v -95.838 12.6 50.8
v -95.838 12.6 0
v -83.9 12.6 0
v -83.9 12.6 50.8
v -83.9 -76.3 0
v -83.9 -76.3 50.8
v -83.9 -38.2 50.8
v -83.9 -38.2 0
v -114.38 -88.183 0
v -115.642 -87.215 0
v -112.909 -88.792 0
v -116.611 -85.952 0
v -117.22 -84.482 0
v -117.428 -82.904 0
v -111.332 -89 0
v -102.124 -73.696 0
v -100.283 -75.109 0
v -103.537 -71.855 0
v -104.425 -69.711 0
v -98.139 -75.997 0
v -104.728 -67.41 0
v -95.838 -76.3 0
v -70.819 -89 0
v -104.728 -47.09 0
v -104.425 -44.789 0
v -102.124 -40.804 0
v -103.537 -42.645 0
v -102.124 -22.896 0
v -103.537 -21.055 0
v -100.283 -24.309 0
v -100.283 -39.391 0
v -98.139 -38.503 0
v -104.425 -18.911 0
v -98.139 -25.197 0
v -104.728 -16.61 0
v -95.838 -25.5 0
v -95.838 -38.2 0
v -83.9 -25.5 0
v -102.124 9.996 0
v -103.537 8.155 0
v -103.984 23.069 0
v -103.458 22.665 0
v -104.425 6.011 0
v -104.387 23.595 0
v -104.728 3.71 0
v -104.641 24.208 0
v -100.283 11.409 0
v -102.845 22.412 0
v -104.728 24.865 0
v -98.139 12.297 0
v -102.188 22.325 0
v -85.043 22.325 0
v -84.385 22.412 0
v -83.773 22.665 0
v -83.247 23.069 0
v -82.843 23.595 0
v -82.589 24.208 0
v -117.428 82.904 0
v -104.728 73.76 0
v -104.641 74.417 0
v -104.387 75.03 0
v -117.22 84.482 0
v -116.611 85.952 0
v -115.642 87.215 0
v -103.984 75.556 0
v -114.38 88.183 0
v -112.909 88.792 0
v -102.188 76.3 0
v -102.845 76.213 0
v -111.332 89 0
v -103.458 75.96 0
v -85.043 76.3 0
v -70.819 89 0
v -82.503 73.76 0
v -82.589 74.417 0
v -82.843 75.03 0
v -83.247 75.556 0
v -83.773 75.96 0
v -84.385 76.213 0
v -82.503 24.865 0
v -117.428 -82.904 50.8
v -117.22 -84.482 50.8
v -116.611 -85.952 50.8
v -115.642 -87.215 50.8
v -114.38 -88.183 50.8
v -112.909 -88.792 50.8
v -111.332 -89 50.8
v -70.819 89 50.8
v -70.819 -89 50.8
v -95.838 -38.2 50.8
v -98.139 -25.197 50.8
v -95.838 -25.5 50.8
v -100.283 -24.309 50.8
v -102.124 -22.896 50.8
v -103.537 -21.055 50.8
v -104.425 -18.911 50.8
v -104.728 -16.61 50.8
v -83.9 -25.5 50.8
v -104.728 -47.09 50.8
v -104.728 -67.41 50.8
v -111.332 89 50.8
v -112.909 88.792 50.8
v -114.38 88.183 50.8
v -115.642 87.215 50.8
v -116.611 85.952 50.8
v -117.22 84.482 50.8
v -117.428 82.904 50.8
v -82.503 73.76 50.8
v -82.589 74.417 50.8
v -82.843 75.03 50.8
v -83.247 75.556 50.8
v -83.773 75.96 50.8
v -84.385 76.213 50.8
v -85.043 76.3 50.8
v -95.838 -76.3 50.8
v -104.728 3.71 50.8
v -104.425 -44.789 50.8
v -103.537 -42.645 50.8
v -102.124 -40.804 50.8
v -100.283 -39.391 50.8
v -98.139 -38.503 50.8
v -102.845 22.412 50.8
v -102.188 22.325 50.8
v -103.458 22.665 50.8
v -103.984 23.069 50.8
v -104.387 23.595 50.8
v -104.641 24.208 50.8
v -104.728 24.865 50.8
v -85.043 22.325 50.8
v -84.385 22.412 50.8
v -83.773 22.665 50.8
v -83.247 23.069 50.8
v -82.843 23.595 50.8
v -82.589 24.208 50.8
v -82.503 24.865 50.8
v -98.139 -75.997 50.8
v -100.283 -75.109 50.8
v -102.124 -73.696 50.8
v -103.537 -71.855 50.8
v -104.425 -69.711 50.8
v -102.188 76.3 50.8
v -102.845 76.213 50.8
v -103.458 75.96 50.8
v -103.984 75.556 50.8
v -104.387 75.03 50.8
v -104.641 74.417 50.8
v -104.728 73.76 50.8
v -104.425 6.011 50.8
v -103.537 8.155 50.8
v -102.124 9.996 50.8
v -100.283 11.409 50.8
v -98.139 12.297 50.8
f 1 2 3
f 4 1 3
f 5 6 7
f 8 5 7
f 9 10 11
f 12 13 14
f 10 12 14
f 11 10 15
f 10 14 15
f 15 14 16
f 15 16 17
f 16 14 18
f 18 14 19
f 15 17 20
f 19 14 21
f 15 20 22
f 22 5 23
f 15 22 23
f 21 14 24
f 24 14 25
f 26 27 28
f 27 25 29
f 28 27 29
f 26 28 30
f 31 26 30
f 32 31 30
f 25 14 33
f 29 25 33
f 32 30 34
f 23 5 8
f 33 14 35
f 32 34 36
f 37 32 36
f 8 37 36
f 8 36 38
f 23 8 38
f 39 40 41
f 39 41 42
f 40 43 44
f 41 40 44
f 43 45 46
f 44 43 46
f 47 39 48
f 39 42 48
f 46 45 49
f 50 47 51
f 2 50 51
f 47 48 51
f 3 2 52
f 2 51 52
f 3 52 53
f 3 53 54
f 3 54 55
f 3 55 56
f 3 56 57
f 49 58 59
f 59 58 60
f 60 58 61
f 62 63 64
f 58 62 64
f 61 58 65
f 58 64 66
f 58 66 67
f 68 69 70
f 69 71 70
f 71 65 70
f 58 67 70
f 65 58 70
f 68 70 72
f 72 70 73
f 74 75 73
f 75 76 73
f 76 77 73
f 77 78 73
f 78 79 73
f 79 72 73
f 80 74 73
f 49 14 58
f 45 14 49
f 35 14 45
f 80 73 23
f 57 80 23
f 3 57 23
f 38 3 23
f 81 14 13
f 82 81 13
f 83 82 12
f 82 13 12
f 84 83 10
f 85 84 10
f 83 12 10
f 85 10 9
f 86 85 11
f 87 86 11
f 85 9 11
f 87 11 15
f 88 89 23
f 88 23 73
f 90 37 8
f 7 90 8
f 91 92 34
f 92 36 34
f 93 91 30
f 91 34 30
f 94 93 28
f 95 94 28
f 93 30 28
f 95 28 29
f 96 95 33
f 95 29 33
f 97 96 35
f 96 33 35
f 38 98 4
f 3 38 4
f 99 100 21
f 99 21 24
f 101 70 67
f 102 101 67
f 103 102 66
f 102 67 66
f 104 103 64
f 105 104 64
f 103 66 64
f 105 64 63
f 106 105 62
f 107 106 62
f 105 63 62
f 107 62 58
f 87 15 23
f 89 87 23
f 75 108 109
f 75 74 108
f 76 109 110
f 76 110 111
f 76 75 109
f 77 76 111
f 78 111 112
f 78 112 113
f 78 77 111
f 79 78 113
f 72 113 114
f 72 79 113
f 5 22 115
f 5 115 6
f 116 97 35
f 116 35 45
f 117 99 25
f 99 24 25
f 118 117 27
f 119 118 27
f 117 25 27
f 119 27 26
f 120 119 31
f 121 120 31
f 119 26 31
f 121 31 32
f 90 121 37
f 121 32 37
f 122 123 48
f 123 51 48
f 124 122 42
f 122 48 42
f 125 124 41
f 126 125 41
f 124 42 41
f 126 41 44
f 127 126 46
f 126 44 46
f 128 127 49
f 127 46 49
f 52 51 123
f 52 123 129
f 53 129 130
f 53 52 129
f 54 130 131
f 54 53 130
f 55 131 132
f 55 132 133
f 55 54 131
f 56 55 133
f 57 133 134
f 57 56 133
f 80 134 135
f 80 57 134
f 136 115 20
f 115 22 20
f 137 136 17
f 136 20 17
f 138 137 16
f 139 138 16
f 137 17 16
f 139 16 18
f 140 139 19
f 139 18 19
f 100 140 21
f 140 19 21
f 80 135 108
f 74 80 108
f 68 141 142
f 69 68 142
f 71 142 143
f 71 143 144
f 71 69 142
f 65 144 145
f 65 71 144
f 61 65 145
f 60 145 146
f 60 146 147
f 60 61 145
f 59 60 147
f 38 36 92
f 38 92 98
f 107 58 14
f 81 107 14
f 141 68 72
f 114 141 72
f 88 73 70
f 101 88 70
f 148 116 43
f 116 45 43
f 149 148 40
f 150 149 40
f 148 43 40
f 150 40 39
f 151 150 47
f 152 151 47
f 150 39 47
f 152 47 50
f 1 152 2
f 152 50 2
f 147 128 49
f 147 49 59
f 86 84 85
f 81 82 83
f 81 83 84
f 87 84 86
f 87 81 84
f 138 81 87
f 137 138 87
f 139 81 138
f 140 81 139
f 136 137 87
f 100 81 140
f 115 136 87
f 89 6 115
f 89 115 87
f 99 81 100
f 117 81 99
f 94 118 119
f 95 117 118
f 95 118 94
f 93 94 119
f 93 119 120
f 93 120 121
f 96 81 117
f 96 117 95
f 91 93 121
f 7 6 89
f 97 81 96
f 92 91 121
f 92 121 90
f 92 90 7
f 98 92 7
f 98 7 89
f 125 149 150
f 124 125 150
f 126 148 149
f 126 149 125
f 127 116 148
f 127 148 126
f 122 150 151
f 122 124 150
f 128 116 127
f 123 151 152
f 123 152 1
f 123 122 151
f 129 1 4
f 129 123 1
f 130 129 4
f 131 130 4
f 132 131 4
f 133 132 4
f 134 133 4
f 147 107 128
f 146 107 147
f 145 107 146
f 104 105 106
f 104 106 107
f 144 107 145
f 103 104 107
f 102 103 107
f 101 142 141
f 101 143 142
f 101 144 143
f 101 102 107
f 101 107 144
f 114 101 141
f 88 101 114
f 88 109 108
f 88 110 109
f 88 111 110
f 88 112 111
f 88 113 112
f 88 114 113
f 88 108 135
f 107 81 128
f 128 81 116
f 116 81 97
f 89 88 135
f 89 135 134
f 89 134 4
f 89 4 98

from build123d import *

# Parameters (mm, degrees)
F1_DEPTH = 50.8
F2_W     = 20.828
F2_H     = 38.1
F3_DEPTH = 50.8
F4_W     = 22.225
F4_H     = 53.975
F5_DEPTH = 50.8
F6_R     = 8.89
F7_R     = 2.54
F8_W     = 276.807827
F8_H     = 218.873116
F9_DEPTH = 50.8


with BuildPart() as f1:
    # F0 (on Top) → F1 (new body)
    with BuildSketch(Plane.XY):
        with BuildLine():
            ThreePointArc((-111.331622, 89), (-115.642145, 87.214523), (-117.427622, 82.904))
            Line((-117.427622, 82.904), (-117.427622, -82.904))
            ThreePointArc((-117.427622, -82.904), (-115.642145, -87.214523), (-111.331622, -89))
            Line((-111.331622, -89), (111.331622, -89))
            ThreePointArc((111.331622, -89), (115.642145, -87.214523), (117.427622, -82.904))
            Line((117.427622, -82.904), (117.427622, 82.904))
            ThreePointArc((117.427622, 82.904), (115.642145, 87.214523), (111.331622, 89))
            Line((111.331622, 89), (-111.331622, 89))
        make_face()
        with BuildLine():
            ThreePointArc((-60.918022, -10.802655), (-61.609639, -0.559986), (-60.913995, 9.68241))
            Line((-60.913995, 9.68241), (-55.212554, 14.261207))
            ThreePointArc((-55.212554, 14.261207), (-45.748511, 39.77658), (-28.391702, 60.737103))
            Line((-28.391702, 60.737103), (-27.407633, 67.742944))
            ThreePointArc((-27.407633, 67.742944), (-18.790824, 73.526894), (-9.485241, 78.121416))
            Line((-9.485241, 78.121416), (-2.738388, 75.428307))
            ThreePointArc((-2.738388, 75.428307), (24.098624, 80.048241), (50.935831, 75.42944))
            Line((50.935831, 75.42944), (57.610091, 78.186609))
            ThreePointArc((57.610091, 78.186609), (66.892407, 73.605247), (75.516596, 67.880422))
            Line((75.516596, 67.880422), (76.520517, 60.753405))
            ThreePointArc((76.520517, 60.753405), (79.783196, 57.954312), (82.843276, 54.935057))
            ThreePointArc((82.843276, 54.935057), (104.449894, 47.071779), (100.407804, 24.436881))
            ThreePointArc((100.407804, 24.436881), (101.514269, 20.155202), (102.319921, 15.806873))
            Line((102.319921, 15.806873), (108.049072, 10.873495))
            ThreePointArc((108.049072, 10.873495), (108.709842, 0.589153), (108.105719, -9.698672))
            Line((108.105719, -9.698672), (102.348457, -13.775574))
            ThreePointArc((102.348457, -13.775574), (92.855411, -39.306001), (75.46826, -60.272823))
            Line((75.46826, -60.272823), (74.544008, -67.341163))
            ThreePointArc((74.544008, -67.341163), (66.082602, -73.324939), (56.891661, -78.113213))
            Line((56.891661, -78.113213), (50.250983, -75.428069))
            ThreePointArc((50.250983, -75.428069), (23.341097, -80.124901), (-3.581639, -75.502299))
            Line((-3.581639, -75.502299), (-10.28992, -78.054152))
            ThreePointArc((-10.28992, -78.054152), (-19.562426, -73.562391), (-28.115124, -67.817248))
            Line((-28.115124, -67.817248), (-29.074377, -60.66791))
            ThreePointArc((-29.074377, -60.66791), (-32.330068, -57.869325), (-35.398386, -54.86649))
            ThreePointArc((-35.398386, -54.86649), (-59.811696, -48.379935), (-53.325141, -23.966625))
            ThreePointArc((-53.325141, -23.966625), (-54.434448, -19.687429), (-55.222977, -15.337682))
            Line((-55.222977, -15.337682), (-60.918022, -10.802655))
        make_face(mode=Mode.SUBTRACT)
    extrude(amount=F1_DEPTH)

    # F2 (on face) → F3 (cut)
    with BuildSketch(Plane.XY.offset(50.8)):
        with Locations((-94.313622, -57.25)):
            Rectangle(F2_W, F2_H)
        with Locations((-94.313622, -6.45)):
            Rectangle(F2_W, F2_H)
    extrude(amount=-F3_DEPTH, mode=Mode.SUBTRACT)

    # F4 (on face) → F5 (cut)
    with BuildSketch(Plane.XY.offset(50.8)):
        with Locations((-93.615122, 49.3125)):
            Rectangle(F4_W, F4_H)
    extrude(amount=-F5_DEPTH, mode=Mode.SUBTRACT)

    # F6
    f6_edges = [f1.edges().sort_by_distance(p)[0] for p in [
        (-104.727622, 12.6, 25.4),
        (-104.727622, -38.2, 25.4),
        (-104.727622, -25.5, 25.4),
        (-104.727622, -76.3, 25.4),
    ]]
    fillet(f6_edges, radius=F6_R)

    # F7
    f7_edges = [f1.edges().sort_by_distance(p)[0] for p in [
        (-82.502622, 76.3, 25.4),
        (-104.727622, 76.3, 25.4),
        (-82.502622, 22.325, 25.4),
        (-104.727622, 22.325, 25.4),
    ]]
    fillet(f7_edges, radius=F7_R)

    # F8 (on face) → F9 (cut)
    with BuildSketch(Plane.XY.offset(50.8)):
        with Locations((67.585292, -20.436558)):
            Rectangle(F8_W, F8_H)
    extrude(amount=-F9_DEPTH, mode=Mode.SUBTRACT)


solid = f1.part
